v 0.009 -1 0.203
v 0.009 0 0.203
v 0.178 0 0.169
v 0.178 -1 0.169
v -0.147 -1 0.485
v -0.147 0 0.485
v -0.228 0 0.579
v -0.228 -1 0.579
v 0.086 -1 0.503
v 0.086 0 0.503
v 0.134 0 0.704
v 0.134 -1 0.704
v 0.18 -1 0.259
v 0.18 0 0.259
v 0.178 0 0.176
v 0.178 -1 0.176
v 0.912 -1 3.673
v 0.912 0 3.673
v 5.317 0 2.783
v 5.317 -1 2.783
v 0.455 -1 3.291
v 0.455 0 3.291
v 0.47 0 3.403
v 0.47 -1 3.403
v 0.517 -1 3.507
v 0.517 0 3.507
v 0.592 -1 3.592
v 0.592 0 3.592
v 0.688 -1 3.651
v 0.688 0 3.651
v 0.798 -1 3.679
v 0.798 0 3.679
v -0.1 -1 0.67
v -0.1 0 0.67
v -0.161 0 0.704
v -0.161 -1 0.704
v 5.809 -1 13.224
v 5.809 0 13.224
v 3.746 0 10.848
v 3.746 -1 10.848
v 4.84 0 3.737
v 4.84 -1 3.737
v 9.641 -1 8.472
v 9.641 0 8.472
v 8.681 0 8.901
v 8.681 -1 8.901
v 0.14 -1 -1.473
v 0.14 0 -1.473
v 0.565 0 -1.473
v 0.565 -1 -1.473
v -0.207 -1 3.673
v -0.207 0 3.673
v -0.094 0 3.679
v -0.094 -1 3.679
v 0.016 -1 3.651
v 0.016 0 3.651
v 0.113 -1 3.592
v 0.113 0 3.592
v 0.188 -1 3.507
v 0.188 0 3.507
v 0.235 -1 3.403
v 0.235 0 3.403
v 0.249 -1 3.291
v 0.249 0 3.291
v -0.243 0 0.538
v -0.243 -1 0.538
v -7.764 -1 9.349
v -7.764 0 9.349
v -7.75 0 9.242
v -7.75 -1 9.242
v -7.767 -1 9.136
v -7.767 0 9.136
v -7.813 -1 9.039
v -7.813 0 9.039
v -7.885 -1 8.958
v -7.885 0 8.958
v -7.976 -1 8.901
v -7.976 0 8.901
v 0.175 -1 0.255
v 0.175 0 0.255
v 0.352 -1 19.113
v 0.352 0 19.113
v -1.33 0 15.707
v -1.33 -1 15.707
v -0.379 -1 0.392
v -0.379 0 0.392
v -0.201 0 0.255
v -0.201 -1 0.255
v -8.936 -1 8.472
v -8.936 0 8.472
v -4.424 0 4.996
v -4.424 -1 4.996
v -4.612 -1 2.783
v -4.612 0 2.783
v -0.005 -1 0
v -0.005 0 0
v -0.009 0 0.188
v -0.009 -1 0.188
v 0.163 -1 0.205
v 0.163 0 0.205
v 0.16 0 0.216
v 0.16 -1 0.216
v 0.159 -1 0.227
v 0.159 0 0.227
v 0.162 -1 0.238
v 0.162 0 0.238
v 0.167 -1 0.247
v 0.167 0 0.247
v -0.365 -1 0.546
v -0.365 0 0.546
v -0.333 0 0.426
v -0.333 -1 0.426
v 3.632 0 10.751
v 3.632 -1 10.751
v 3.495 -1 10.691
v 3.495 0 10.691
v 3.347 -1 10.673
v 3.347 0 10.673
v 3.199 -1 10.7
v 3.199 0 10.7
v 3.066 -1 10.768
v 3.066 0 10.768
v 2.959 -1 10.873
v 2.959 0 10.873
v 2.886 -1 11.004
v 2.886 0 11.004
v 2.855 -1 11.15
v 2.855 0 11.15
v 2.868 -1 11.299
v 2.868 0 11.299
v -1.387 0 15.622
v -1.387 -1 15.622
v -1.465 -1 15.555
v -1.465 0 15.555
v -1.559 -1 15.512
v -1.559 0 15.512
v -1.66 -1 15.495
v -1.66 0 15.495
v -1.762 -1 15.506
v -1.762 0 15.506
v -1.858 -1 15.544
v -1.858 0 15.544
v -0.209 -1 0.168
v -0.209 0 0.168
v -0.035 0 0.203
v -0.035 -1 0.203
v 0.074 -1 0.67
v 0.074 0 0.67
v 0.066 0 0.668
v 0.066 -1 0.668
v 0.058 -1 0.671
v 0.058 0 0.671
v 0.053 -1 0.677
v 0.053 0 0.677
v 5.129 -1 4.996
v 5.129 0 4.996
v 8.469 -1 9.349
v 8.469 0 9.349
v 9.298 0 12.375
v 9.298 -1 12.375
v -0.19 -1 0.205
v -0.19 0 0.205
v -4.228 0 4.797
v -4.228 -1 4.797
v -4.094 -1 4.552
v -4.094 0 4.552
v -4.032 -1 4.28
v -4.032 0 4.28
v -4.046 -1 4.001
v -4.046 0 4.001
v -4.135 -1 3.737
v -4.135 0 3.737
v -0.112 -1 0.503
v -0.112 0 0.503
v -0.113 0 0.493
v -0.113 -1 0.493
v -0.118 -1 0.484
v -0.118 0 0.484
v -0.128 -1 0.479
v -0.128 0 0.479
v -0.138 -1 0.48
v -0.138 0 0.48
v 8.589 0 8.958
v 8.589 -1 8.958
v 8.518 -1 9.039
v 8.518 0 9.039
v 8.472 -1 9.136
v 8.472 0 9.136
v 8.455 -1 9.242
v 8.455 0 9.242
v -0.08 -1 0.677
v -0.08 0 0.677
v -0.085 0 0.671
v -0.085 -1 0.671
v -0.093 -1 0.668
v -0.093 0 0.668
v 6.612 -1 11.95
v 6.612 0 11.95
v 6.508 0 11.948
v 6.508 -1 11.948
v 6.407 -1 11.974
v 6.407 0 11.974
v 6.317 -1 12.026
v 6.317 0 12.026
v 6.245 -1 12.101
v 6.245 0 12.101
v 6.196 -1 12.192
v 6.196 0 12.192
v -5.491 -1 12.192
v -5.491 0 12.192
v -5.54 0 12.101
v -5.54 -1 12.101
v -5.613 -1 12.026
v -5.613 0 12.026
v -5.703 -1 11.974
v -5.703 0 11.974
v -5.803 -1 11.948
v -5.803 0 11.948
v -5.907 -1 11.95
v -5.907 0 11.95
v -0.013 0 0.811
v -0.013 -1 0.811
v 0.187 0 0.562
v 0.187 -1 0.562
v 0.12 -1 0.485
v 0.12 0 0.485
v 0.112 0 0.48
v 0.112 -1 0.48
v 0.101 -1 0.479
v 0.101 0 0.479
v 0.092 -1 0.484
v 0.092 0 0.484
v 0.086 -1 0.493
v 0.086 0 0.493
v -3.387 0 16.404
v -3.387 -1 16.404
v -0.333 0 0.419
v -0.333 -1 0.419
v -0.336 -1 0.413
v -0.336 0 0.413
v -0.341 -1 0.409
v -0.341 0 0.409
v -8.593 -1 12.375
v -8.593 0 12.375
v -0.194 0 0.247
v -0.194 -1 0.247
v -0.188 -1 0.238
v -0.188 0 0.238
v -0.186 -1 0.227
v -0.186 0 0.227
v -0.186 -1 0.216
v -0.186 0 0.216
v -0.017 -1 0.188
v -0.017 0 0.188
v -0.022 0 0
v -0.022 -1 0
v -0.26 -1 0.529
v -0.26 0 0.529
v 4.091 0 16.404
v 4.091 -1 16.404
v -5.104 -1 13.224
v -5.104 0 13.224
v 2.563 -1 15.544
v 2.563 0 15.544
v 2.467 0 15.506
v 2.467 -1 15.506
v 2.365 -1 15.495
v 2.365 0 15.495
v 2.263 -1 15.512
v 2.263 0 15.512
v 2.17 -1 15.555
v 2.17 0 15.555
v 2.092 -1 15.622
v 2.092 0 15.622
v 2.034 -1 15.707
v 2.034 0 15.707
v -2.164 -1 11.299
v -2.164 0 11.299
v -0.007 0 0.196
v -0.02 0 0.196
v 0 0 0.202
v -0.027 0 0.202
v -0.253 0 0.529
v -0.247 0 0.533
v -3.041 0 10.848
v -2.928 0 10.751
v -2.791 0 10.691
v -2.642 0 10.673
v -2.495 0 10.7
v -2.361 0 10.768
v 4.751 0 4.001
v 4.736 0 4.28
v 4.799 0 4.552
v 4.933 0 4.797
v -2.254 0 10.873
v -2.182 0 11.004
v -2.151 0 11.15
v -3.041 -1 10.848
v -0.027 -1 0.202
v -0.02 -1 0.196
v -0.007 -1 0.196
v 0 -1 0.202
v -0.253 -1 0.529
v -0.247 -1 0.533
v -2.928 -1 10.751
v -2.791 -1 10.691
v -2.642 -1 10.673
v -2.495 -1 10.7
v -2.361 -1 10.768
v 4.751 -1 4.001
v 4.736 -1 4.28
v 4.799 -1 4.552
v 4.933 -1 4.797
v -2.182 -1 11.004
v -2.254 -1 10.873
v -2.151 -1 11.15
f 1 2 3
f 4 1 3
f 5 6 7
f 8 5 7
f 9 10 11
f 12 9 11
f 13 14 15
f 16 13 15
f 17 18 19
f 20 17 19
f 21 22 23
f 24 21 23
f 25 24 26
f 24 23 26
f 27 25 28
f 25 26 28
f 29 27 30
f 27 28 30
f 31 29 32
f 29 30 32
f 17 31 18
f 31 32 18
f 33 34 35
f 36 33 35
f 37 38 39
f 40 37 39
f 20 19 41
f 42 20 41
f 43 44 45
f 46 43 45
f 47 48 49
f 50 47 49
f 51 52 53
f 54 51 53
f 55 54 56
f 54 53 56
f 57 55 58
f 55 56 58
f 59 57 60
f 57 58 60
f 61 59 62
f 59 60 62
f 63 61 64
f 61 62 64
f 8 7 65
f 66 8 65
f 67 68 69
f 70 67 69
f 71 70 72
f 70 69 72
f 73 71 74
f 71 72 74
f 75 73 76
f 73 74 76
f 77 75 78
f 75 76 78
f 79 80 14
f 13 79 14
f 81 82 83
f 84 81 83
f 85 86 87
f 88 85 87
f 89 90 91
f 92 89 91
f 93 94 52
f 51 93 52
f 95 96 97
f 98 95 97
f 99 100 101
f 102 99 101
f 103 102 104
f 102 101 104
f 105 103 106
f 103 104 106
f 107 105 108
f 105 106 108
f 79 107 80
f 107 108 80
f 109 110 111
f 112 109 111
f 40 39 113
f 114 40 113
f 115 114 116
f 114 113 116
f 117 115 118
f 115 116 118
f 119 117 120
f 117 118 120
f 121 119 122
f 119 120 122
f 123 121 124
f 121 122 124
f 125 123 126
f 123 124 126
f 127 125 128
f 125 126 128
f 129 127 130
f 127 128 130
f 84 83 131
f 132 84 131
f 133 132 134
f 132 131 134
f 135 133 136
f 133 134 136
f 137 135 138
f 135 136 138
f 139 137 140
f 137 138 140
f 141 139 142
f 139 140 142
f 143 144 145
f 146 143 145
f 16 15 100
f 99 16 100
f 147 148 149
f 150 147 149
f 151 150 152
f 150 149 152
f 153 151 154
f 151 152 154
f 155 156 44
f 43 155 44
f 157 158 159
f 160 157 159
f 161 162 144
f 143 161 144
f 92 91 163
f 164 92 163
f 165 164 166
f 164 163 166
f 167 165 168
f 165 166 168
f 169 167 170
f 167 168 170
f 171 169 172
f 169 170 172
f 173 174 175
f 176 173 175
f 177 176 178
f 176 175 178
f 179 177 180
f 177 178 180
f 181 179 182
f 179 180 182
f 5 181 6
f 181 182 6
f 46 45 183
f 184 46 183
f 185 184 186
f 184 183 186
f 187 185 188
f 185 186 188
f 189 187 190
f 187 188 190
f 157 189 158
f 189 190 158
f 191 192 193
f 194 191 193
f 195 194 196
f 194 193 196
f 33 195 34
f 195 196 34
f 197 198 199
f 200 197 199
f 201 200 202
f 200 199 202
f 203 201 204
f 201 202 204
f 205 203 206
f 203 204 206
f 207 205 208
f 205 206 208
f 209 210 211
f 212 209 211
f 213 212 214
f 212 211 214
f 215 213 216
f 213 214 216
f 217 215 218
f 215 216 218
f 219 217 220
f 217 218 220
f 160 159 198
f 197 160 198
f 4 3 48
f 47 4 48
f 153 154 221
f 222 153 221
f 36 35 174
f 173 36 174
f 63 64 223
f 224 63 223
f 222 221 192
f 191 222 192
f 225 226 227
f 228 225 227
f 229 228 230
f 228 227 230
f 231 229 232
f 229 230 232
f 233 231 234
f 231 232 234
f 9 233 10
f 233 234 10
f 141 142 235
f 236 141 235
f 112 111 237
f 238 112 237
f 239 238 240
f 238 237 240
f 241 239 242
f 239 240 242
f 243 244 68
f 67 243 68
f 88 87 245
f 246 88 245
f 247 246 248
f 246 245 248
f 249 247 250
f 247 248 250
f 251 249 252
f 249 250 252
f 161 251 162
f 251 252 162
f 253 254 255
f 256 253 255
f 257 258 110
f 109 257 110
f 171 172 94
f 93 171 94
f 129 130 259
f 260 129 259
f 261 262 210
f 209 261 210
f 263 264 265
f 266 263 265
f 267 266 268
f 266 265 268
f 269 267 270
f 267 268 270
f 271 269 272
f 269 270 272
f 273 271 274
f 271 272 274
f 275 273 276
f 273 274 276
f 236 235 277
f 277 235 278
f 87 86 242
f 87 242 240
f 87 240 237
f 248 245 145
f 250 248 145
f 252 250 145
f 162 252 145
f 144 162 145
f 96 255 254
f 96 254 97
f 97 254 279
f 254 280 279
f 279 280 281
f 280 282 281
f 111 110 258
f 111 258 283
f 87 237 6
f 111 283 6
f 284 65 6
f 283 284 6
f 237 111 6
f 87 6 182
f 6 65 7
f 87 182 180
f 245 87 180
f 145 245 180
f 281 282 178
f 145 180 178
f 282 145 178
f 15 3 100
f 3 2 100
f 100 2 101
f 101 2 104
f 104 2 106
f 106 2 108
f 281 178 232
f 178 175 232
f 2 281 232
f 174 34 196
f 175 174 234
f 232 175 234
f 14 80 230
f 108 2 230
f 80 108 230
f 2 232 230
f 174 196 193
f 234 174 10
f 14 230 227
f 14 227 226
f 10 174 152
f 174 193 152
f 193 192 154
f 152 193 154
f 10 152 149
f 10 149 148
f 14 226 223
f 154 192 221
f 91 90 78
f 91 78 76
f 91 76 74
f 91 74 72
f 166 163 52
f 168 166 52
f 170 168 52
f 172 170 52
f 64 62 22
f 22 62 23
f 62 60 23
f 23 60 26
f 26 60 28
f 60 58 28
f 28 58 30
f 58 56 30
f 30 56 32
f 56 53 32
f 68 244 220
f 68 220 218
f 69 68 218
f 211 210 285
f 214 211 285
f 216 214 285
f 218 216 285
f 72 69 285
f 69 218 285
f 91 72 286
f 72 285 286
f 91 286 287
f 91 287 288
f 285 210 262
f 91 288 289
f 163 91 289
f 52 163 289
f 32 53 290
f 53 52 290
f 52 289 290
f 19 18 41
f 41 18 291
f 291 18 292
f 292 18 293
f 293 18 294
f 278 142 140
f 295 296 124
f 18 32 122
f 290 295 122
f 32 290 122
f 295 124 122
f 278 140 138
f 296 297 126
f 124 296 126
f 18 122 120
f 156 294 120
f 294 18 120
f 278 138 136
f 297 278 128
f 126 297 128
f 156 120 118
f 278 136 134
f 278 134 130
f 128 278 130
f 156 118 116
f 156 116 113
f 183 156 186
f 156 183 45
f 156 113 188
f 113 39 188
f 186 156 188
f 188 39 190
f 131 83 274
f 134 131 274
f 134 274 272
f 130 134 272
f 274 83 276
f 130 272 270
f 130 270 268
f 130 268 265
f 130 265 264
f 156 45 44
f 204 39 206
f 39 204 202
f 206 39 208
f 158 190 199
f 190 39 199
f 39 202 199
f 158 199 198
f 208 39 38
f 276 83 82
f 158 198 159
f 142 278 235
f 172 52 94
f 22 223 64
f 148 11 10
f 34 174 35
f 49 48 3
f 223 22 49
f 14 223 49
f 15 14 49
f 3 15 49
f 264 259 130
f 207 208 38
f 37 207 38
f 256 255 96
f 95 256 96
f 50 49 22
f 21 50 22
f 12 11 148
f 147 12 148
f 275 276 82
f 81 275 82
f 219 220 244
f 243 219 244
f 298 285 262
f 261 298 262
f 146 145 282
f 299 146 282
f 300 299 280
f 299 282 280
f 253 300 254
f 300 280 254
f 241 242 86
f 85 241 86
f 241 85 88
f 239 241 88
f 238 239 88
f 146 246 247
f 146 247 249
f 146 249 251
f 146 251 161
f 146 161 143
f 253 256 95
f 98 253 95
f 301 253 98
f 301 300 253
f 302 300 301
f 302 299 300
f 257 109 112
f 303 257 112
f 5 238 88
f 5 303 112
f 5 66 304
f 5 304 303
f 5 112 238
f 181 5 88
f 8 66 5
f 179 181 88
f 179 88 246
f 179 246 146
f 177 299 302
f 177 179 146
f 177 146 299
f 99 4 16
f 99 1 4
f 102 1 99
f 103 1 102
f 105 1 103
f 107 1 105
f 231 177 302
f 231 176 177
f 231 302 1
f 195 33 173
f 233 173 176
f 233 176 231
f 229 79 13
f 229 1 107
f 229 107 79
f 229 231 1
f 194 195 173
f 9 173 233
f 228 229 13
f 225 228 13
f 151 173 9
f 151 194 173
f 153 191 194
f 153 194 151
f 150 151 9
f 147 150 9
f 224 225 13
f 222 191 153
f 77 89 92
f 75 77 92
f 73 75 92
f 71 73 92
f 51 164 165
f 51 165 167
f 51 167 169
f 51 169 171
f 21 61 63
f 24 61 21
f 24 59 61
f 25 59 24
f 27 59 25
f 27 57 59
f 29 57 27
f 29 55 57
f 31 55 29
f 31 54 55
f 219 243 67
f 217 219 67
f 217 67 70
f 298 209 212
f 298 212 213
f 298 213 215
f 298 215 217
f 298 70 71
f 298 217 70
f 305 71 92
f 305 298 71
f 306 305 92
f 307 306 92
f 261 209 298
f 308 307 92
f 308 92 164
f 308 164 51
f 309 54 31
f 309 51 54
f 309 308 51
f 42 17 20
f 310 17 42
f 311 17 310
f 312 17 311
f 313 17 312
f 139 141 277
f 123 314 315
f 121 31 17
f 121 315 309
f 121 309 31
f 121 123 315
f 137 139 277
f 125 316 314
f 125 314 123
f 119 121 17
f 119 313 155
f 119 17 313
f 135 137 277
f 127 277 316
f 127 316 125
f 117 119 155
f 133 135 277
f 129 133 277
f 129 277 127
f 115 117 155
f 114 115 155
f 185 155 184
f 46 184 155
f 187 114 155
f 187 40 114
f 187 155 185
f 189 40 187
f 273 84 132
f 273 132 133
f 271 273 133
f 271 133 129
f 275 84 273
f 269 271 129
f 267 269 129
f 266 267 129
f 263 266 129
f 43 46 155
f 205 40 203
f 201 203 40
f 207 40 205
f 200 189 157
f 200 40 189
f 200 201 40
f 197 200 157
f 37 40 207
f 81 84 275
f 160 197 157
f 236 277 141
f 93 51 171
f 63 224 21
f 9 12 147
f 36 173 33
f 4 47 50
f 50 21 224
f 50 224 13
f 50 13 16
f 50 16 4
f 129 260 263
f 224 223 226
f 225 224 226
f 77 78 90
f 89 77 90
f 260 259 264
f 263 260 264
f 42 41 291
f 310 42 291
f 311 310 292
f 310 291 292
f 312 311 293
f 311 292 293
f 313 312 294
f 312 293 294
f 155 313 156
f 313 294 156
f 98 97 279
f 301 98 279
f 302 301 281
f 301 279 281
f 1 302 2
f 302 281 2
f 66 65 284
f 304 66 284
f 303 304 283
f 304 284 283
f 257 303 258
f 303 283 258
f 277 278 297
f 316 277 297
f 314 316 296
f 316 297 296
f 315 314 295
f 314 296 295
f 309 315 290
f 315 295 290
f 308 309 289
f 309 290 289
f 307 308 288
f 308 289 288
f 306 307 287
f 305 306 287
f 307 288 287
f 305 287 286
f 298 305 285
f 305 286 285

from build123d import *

# Parameters (mm, degrees)
F1_DEPTH = 1


# Not quite as in the source:
# - ends of sketch curves that miss each other by under 0.0002 mm in the source are joined


with BuildPart() as f1:
    # F0 (on Front) → F1 (new body)
    with BuildSketch(Plane.XZ):
        with BuildLine():
            Line((0.0528919554, 0.676734003), (-0.0133260446, 0.810837003))
            Line((-0.0133260446, 0.810837003), (-0.0133260446, 0.000355003))
            Line((-0.0133260446, 0.000355003), (-0.0049730446, 0.000355003))
            Line((-0.0049730446, 0.000355003), (-0.0092700446, 0.187913003))
            ThreePointArc((-0.0092700446, 0.187913003), (-0.0039052307, 0.1997565793), (0.0086959613, 0.2029600321))
            Line((0.0086959613, 0.2029600321), (0.1777903392, 0.168795789))
            Line((0.1777903392, 0.168795789), (0.1779611806, 0.1762527791))
            Line((0.1779611806, 0.1762527791), (0.1633489554, 0.205464003))
            ThreePointArc((0.1633489554, 0.205464003), (0.1601341311, 0.2322960931), (0.1747150055, 0.255048938))
            Line((0.1747150055, 0.255048938), (0.1798571632, 0.2590097465))
            Line((0.1798571632, 0.2590097465), (0.1868000755, 0.5620580937))
            Line((0.1868000755, 0.5620580937), (0.1202859554, 0.485431003))
            ThreePointArc((0.1202859554, 0.485431003), (0.0960352028, 0.4807561402), (0.0857322231, 0.5032011784))
            Line((0.0857322231, 0.5032011784), (0.1338759554, 0.704181003))
            Line((0.1338759554, 0.704181003), (0.0737009554, 0.670304003))
            ThreePointArc((0.0737009554, 0.670304003), (0.0619135468, 0.669043597), (0.0528919554, 0.676734003))
        make_face()
        with BuildLine():
            Line((-0.0133260446, 0.000355003), (-0.0133260446, 0.810837003))
            Line((-0.0133260446, 0.810837003), (-0.0795450446, 0.676734003))
            ThreePointArc((-0.0795450446, 0.676734003), (-0.0885662197, 0.6690437257), (-0.1003531884, 0.6703037475))
            Line((-0.1003531884, 0.6703037475), (-0.1605290446, 0.704181003))
            Line((-0.1605290446, 0.704181003), (-0.1123850446, 0.503201003))
            ThreePointArc((-0.1123850446, 0.503201003), (-0.1226883956, 0.4807560869), (-0.1469384945, 0.4854314805))
            Line((-0.1469384945, 0.4854314805), (-0.2281400446, 0.578978003))
            Line((-0.2281400446, 0.578978003), (-0.2433770446, 0.538362003))
            ThreePointArc((-0.2433770446, 0.538362003), (-0.2498706649, 0.5306698392), (-0.2597650019, 0.5288152727))
            Line((-0.2597650019, 0.5288152727), (-0.3654970446, 0.545543003))
            Line((-0.3654970446, 0.545543003), (-0.3328600446, 0.426430003))
            ThreePointArc((-0.3328600446, 0.426430003), (-0.3337663691, 0.4160544447), (-0.3412100188, 0.4087699453))
            Line((-0.3412100188, 0.4087699453), (-0.3790200446, 0.391884003))
            Line((-0.3790200446, 0.391884003), (-0.2013670446, 0.255049003))
            ThreePointArc((-0.2013670446, 0.255049003), (-0.1867871318, 0.232295707), (-0.1900021575, 0.2054640595))
            Line((-0.1900021575, 0.2054640595), (-0.2087830446, 0.167919003))
            Line((-0.2087830446, 0.167919003), (-0.0353490446, 0.202960003))
            ThreePointArc((-0.0353490446, 0.202960003), (-0.0227478586, 0.1997565793), (-0.0173829897, 0.1879130018))
            Line((-0.0173829897, 0.1879130018), (-0.0216800446, 0.000355003))
            Line((-0.0216800446, 0.000355003), (-0.0133260446, 0.000355003))
        make_face()
        Polygon((0.1779611806, 0.1762527791), (0.1777903392, 0.168795789), (0.1821299554, 0.167919003), align=None)
        Polygon((0.1821299554, 0.167919003), (0.1777903392, 0.168795789), (0.1401753438, -1.4730457961), (0.3523669438, -1.4730457961), (0.3523669438, 0.391884003), (0.1798571632, 0.2590097465), (0.1779611806, 0.1762527791), align=None)
        with BuildLine():
            Line((0.2493191438, 3.2909274039), (0.1868000755, 0.5620580937))
            Line((0.1868000755, 0.5620580937), (0.2014869554, 0.578978003))
            Line((0.2014869554, 0.578978003), (0.2167249554, 0.538362003))
            ThreePointArc((0.2167249554, 0.538362003), (0.2232185757, 0.5306698392), (0.2331129127, 0.5288152727))
            Line((0.2331129127, 0.5288152727), (0.3388449554, 0.545543003))
            Line((0.3388449554, 0.545543003), (0.3062069554, 0.426430003))
            ThreePointArc((0.3062069554, 0.426430003), (0.3071132799, 0.4160544447), (0.3145569296, 0.4087699453))
            Line((0.3145569296, 0.4087699453), (0.3523669554, 0.391884003))
            Line((0.3523669554, 0.391884003), (0.3523669438, 19.1131970039))
            Line((0.3523669438, 19.1131970039), (-1.3295956562, 15.7069808039))
            ThreePointArc((-1.3295956562, 15.7069808039), (-1.5587335044, 15.5116477594), (-1.858122509, 15.5436523149))
            Line((-1.858122509, 15.5436523149), (-3.3865892562, 16.4041346039))
            Line((-3.3865892562, 16.4041346039), (-2.1637316562, 11.2992426039))
            ThreePointArc((-2.1637316562, 11.2992426039), (-2.4254367706, 10.7291417351), (-3.0413892842, 10.8478967322))
            Line((-3.0413892842, 10.8478967322), (-5.1039086562, 13.2239784039))
            Line((-5.1039086562, 13.2239784039), (-5.4909284562, 12.1923320039))
            ThreePointArc((-5.4909284562, 12.1923320039), (-5.6558664119, 11.996951044), (-5.9071825723, 11.9498450545))
            Line((-5.9071825723, 11.9498450545), (-8.5927764562, 12.3747294039))
            Line((-8.5927764562, 12.3747294039), (-7.7637966562, 9.3492592039))
            ThreePointArc((-7.7637966562, 9.3492592039), (-7.786817298, 9.0857200238), (-7.9758860019, 8.9006937389))
            Line((-7.9758860019, 8.9006937389), (-8.9362606562, 8.4717908039))
            Line((-8.9362606562, 8.4717908039), (-4.4238744562, 4.9961818039))
            ThreePointArc((-4.4238744562, 4.9961818039), (-4.0535446709, 4.4182480852), (-4.1352063244, 3.7367242387))
            Line((-4.1352063244, 3.7367242387), (-4.6122408562, 2.7830798039))
            Line((-4.6122408562, 2.7830798039), (-0.2070172562, 3.6731212039))
            ThreePointArc((-0.2070172562, 3.6731212039), (0.1130528694, 3.5917542423), (0.2493191438, 3.2909274039))
        make_face()
        with BuildLine():
            Line((0.2014869554, 0.578978003), (0.1868000755, 0.5620580937))
            Line((0.1868000755, 0.5620580937), (0.1798571632, 0.2590097465))
            Line((0.1798571632, 0.2590097465), (0.3523669554, 0.391884003))
            Line((0.3523669554, 0.391884003), (0.3145569554, 0.408770003))
            ThreePointArc((0.3145569554, 0.408770003), (0.3071132799, 0.4160544447), (0.3062071928, 0.426429938))
            Line((0.3062071928, 0.426429938), (0.3388449554, 0.545543003))
            Line((0.3388449554, 0.545543003), (0.2331129554, 0.528815003))
            ThreePointArc((0.2331129554, 0.528815003), (0.2232185757, 0.5306698392), (0.2167248398, 0.5383619597))
            Line((0.2167248398, 0.5383619597), (0.2014869554, 0.578978003))
        make_face()
        with BuildLine():
            Line((0.3523669438, 0.391884003), (0.3523669438, -1.4730457961))
            Line((0.3523669438, -1.4730457961), (0.5645331438, -1.4730457961))
            Line((0.5645331438, -1.4730457961), (0.4553893438, 3.2909274039))
            ThreePointArc((0.4553893438, 3.2909274039), (0.5916556183, 3.5917542423), (0.9117258932, 3.6731219434))
            Line((0.9117258932, 3.6731219434), (5.3169493438, 2.7830798039))
            Line((5.3169493438, 2.7830798039), (4.8399119438, 3.7367228039))
            ThreePointArc((4.8399119438, 3.7367228039), (4.7582554065, 4.4182578922), (5.1286096155, 4.9961801528))
            Line((5.1286096155, 4.9961801528), (9.6409691438, 8.4717908039))
            Line((9.6409691438, 8.4717908039), (8.6805951438, 8.9006952039))
            ThreePointArc((8.6805951438, 8.9006952039), (8.4915257857, 9.0857200238), (8.4685111742, 9.3492575516))
            Line((8.4685111742, 9.3492575516), (9.2975103438, 12.3747294039))
            Line((9.2975103438, 12.3747294039), (6.6119175438, 11.9498382039))
            ThreePointArc((6.6119175438, 11.9498382039), (6.3606002996, 11.996951044), (6.1956594084, 12.1923309026))
            Line((6.1956594084, 12.1923309026), (5.8086171438, 13.2239784039))
            Line((5.8086171438, 13.2239784039), (3.7461117438, 10.8478846039))
            ThreePointArc((3.7461117438, 10.8478846039), (3.1301426273, 10.7291430881), (2.8684469448, 11.2992470593))
            Line((2.8684469448, 11.2992470593), (4.0912977438, 16.4041346039))
            Line((4.0912977438, 16.4041346039), (2.5628527438, 15.5436588039))
            ThreePointArc((2.5628527438, 15.5436588039), (2.2634525656, 15.511644492), (2.0343082289, 15.7069828209))
            Line((2.0343082289, 15.7069828209), (0.3523669438, 19.1131970039))
            Line((0.3523669438, 19.1131970039), (0.3523669438, 0.391884003))
        make_face()
    extrude(amount=F1_DEPTH)


solid = f1.part
